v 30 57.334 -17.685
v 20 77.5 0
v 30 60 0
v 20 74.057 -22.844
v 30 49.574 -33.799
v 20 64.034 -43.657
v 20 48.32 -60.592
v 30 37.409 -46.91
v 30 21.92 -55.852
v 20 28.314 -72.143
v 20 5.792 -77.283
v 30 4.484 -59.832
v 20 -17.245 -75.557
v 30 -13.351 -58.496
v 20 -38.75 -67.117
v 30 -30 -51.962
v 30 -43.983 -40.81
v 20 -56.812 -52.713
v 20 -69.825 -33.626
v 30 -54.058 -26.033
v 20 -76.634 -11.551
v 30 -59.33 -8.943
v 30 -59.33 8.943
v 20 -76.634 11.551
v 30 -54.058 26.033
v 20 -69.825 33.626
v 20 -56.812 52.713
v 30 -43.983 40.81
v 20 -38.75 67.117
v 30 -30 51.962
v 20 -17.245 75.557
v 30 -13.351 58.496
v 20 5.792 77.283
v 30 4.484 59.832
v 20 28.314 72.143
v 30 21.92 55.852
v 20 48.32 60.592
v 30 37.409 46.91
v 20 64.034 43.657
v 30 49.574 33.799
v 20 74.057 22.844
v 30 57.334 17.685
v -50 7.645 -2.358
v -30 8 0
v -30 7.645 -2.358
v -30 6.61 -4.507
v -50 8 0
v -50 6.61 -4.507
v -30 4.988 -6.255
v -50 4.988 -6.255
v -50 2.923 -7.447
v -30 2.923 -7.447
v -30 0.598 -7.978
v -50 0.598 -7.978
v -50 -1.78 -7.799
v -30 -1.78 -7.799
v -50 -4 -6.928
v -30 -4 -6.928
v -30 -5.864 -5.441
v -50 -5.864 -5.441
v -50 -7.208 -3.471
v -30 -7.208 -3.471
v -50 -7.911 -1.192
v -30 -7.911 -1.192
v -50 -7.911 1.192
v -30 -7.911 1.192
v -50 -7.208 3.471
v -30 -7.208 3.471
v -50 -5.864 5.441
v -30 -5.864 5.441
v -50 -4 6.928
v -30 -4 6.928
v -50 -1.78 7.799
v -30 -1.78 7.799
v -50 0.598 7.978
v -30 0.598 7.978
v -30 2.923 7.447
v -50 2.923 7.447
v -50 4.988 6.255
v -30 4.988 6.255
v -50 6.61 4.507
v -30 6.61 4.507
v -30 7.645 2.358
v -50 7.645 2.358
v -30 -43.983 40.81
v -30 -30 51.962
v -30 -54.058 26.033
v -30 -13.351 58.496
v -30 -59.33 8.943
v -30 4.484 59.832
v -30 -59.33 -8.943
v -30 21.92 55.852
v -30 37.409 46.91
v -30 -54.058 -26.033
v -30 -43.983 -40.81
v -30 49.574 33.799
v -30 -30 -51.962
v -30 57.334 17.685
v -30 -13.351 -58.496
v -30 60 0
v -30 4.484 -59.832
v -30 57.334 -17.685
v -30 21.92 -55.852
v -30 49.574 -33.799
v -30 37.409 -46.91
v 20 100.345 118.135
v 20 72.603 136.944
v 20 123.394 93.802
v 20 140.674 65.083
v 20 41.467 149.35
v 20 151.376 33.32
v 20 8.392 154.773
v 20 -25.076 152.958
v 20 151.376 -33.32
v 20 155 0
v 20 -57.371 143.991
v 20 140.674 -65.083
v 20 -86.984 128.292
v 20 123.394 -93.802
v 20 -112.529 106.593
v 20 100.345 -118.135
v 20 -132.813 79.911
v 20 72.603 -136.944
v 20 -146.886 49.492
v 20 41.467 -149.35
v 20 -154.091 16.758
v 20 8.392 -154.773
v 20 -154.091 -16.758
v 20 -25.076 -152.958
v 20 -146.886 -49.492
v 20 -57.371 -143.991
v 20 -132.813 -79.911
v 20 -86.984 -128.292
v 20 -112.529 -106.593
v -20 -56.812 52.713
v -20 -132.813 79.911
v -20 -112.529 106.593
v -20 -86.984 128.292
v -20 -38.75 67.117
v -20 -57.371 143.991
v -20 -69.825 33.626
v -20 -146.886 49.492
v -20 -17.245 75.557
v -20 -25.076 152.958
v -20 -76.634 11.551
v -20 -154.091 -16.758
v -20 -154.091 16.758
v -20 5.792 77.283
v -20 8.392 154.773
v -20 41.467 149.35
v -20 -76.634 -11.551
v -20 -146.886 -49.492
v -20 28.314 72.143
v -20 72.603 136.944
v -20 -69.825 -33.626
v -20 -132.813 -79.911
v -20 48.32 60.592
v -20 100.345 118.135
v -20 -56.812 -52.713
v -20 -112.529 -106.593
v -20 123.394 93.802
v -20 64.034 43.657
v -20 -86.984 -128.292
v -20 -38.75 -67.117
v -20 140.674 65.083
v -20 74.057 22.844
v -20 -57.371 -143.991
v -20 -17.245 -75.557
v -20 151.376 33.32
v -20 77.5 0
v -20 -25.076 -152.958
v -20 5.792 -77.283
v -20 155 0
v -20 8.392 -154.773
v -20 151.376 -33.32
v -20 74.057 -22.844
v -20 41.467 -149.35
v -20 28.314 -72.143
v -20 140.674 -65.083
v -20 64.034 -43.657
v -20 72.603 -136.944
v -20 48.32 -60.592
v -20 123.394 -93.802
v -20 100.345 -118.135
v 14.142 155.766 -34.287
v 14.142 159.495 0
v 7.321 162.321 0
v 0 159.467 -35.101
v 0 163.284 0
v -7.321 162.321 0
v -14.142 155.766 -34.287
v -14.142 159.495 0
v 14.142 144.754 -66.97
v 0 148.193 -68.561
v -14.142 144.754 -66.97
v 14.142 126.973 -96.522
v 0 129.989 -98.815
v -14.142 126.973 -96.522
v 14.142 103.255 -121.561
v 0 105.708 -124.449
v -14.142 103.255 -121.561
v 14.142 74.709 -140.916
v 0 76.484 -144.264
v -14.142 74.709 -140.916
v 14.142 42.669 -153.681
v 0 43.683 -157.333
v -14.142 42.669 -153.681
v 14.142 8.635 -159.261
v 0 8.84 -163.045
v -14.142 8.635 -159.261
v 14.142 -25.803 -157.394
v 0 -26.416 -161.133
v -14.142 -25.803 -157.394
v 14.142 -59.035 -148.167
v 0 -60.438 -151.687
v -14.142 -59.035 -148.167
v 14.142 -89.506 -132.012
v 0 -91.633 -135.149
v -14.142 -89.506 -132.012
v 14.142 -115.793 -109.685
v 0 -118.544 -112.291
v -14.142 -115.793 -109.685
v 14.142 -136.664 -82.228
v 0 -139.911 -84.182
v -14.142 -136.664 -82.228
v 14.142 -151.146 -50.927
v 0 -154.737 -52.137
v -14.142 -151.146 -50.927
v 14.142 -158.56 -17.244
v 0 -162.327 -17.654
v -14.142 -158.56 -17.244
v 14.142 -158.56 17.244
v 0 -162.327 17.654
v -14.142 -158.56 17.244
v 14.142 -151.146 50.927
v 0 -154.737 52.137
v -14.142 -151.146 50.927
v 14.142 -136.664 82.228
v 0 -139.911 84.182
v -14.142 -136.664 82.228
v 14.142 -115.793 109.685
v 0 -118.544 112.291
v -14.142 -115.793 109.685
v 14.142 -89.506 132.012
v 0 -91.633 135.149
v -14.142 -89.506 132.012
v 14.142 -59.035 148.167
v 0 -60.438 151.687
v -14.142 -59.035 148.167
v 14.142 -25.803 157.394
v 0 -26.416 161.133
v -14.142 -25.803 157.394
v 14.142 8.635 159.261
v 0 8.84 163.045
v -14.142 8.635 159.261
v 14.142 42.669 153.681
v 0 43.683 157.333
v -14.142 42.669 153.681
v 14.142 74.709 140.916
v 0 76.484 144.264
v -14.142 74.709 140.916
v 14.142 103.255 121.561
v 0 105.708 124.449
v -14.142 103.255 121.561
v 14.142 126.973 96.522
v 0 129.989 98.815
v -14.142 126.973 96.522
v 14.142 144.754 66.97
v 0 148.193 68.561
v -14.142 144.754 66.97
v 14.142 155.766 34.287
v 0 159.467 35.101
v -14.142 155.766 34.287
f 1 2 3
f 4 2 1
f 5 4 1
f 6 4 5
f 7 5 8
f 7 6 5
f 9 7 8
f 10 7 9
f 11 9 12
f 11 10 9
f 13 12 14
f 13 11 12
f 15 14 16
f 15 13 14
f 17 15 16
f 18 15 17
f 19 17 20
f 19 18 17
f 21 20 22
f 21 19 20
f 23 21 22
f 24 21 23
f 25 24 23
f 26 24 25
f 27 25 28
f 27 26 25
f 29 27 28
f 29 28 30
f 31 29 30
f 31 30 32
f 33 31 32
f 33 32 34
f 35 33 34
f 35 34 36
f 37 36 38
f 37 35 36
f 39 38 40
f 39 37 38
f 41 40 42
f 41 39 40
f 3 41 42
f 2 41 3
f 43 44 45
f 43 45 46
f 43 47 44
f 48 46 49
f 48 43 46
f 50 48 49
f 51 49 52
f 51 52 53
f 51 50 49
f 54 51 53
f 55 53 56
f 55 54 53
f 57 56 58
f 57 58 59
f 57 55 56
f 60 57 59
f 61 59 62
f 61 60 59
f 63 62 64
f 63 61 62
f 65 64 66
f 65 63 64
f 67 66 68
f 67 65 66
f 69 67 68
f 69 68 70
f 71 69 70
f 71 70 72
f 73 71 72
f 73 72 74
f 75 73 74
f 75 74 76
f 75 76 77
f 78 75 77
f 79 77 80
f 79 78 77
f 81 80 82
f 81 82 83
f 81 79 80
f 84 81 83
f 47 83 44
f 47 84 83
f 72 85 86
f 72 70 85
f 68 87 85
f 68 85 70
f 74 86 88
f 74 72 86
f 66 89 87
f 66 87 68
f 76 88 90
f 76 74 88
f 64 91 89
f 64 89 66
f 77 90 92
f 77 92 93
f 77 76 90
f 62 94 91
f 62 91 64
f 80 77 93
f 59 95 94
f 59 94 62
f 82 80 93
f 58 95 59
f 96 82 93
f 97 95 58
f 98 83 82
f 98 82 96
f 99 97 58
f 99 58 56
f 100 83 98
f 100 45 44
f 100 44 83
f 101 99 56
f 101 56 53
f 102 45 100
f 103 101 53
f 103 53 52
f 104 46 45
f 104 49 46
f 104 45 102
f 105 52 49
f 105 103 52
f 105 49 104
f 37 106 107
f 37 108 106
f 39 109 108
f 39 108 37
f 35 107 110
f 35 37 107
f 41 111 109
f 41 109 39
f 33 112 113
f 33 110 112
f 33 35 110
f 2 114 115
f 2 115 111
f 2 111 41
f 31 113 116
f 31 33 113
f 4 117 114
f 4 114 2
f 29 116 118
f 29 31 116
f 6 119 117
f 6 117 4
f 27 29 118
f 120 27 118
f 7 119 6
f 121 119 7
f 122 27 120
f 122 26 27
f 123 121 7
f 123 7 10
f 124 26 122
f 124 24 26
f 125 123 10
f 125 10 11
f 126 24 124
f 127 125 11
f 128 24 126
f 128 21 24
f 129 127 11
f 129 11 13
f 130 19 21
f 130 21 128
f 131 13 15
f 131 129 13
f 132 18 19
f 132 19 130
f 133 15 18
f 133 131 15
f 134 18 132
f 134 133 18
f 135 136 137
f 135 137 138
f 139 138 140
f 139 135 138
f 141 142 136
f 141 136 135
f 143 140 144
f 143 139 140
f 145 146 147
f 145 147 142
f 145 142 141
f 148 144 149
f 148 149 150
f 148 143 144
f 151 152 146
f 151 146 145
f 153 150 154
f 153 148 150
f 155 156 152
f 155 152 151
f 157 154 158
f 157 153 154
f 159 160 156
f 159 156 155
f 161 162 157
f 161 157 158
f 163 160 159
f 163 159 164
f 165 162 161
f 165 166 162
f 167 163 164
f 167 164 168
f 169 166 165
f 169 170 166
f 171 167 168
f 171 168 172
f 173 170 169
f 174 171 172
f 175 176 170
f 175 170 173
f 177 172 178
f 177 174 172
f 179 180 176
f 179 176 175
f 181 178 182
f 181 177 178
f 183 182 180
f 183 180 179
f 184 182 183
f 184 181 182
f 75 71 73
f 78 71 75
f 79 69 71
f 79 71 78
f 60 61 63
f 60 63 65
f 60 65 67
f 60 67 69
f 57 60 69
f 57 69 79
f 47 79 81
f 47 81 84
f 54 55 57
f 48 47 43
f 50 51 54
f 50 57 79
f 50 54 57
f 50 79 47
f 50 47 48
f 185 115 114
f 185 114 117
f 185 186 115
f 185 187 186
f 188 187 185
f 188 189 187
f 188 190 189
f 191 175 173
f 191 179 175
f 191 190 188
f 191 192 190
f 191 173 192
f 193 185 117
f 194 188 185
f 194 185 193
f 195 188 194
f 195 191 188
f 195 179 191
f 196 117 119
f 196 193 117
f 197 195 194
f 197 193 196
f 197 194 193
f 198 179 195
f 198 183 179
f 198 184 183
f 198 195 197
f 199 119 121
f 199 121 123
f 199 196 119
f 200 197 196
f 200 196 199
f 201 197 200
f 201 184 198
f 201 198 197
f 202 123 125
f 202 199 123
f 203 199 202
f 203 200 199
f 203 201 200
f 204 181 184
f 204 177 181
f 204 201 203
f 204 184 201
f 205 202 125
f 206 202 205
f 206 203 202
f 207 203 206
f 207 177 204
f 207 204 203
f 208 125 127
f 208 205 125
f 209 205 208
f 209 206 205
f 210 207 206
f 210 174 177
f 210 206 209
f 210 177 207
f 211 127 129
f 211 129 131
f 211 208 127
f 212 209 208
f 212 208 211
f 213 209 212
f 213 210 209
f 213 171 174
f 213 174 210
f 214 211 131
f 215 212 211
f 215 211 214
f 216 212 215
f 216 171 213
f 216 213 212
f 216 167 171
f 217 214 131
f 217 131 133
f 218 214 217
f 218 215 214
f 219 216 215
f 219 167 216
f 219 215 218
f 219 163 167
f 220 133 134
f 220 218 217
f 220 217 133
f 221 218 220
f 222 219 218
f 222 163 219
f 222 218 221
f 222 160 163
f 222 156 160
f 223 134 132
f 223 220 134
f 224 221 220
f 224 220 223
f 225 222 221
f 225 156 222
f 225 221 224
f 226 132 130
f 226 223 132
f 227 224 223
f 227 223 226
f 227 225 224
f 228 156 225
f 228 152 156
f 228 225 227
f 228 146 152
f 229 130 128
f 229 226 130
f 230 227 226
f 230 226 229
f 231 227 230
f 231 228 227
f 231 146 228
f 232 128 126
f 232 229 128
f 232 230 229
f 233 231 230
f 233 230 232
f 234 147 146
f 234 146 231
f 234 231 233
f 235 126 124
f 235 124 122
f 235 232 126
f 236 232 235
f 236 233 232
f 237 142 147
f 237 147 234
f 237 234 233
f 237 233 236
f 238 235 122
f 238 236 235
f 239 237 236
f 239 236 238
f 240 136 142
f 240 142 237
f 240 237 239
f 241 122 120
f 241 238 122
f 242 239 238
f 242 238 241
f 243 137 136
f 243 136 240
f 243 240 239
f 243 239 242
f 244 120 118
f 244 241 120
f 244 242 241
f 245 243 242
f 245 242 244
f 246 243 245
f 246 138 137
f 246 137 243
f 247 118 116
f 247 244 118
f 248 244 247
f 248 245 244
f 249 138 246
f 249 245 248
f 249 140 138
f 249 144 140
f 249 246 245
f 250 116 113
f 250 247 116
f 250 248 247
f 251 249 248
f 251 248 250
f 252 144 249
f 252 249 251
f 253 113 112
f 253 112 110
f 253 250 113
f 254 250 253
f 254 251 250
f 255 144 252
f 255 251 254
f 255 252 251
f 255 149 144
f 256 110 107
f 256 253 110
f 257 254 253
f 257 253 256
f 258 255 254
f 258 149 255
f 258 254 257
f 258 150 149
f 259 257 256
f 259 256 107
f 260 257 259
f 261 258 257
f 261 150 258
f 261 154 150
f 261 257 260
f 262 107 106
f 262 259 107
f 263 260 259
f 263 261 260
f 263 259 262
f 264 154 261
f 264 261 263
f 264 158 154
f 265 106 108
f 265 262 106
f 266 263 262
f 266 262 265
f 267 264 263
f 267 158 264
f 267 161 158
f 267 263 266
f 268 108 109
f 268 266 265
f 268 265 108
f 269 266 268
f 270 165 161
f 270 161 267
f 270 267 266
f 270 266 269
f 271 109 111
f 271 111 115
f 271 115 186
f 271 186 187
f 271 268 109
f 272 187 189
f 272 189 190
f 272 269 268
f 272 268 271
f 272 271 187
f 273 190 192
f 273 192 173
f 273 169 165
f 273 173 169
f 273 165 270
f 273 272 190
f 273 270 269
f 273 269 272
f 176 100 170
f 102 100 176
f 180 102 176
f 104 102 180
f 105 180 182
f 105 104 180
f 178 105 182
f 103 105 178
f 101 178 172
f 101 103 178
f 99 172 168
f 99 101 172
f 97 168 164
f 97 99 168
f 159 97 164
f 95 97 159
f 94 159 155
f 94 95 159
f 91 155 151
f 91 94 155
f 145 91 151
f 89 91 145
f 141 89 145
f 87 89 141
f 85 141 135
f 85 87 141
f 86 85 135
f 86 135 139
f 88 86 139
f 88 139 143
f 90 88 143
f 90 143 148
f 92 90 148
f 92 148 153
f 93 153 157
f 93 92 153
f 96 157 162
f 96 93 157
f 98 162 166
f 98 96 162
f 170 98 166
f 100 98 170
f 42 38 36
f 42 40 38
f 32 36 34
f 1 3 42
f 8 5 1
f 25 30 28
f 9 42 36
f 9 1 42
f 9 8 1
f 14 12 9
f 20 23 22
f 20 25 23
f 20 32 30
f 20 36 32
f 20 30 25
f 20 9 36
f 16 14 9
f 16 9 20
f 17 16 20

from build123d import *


with BuildPart() as part:
    # 草图1 → 旋转1 (revolve)
    with BuildSketch(Plane.XY):
        with BuildLine():
            Line((0, 0), (20, 0))
            Line((20, 0), (30, 0))
            Line((30, 0), (30, 60))
            Line((30, 60), (20, 77.5))
            Line((20, 77.5), (20, 155))
            ThreePointArc((20, 155), (0, 163.284271247), (-20, 155))
            Line((-20, 155), (-20, 77.5))
            Line((-20, 77.5), (-30, 60))
            Line((-30, 60), (-30, 8))
            Line((-30, 8), (-50, 8))
            Line((-50, 8), (-50, 0))
            Line((-50, 0), (-30, 0))
            Line((-30, 0), (-20, 0))
            Line((-20, 0), (0, 0))
        make_face()
    revolve(axis=Axis((0, 0, 0), (-1, 0, 0)))


solid = part.part
